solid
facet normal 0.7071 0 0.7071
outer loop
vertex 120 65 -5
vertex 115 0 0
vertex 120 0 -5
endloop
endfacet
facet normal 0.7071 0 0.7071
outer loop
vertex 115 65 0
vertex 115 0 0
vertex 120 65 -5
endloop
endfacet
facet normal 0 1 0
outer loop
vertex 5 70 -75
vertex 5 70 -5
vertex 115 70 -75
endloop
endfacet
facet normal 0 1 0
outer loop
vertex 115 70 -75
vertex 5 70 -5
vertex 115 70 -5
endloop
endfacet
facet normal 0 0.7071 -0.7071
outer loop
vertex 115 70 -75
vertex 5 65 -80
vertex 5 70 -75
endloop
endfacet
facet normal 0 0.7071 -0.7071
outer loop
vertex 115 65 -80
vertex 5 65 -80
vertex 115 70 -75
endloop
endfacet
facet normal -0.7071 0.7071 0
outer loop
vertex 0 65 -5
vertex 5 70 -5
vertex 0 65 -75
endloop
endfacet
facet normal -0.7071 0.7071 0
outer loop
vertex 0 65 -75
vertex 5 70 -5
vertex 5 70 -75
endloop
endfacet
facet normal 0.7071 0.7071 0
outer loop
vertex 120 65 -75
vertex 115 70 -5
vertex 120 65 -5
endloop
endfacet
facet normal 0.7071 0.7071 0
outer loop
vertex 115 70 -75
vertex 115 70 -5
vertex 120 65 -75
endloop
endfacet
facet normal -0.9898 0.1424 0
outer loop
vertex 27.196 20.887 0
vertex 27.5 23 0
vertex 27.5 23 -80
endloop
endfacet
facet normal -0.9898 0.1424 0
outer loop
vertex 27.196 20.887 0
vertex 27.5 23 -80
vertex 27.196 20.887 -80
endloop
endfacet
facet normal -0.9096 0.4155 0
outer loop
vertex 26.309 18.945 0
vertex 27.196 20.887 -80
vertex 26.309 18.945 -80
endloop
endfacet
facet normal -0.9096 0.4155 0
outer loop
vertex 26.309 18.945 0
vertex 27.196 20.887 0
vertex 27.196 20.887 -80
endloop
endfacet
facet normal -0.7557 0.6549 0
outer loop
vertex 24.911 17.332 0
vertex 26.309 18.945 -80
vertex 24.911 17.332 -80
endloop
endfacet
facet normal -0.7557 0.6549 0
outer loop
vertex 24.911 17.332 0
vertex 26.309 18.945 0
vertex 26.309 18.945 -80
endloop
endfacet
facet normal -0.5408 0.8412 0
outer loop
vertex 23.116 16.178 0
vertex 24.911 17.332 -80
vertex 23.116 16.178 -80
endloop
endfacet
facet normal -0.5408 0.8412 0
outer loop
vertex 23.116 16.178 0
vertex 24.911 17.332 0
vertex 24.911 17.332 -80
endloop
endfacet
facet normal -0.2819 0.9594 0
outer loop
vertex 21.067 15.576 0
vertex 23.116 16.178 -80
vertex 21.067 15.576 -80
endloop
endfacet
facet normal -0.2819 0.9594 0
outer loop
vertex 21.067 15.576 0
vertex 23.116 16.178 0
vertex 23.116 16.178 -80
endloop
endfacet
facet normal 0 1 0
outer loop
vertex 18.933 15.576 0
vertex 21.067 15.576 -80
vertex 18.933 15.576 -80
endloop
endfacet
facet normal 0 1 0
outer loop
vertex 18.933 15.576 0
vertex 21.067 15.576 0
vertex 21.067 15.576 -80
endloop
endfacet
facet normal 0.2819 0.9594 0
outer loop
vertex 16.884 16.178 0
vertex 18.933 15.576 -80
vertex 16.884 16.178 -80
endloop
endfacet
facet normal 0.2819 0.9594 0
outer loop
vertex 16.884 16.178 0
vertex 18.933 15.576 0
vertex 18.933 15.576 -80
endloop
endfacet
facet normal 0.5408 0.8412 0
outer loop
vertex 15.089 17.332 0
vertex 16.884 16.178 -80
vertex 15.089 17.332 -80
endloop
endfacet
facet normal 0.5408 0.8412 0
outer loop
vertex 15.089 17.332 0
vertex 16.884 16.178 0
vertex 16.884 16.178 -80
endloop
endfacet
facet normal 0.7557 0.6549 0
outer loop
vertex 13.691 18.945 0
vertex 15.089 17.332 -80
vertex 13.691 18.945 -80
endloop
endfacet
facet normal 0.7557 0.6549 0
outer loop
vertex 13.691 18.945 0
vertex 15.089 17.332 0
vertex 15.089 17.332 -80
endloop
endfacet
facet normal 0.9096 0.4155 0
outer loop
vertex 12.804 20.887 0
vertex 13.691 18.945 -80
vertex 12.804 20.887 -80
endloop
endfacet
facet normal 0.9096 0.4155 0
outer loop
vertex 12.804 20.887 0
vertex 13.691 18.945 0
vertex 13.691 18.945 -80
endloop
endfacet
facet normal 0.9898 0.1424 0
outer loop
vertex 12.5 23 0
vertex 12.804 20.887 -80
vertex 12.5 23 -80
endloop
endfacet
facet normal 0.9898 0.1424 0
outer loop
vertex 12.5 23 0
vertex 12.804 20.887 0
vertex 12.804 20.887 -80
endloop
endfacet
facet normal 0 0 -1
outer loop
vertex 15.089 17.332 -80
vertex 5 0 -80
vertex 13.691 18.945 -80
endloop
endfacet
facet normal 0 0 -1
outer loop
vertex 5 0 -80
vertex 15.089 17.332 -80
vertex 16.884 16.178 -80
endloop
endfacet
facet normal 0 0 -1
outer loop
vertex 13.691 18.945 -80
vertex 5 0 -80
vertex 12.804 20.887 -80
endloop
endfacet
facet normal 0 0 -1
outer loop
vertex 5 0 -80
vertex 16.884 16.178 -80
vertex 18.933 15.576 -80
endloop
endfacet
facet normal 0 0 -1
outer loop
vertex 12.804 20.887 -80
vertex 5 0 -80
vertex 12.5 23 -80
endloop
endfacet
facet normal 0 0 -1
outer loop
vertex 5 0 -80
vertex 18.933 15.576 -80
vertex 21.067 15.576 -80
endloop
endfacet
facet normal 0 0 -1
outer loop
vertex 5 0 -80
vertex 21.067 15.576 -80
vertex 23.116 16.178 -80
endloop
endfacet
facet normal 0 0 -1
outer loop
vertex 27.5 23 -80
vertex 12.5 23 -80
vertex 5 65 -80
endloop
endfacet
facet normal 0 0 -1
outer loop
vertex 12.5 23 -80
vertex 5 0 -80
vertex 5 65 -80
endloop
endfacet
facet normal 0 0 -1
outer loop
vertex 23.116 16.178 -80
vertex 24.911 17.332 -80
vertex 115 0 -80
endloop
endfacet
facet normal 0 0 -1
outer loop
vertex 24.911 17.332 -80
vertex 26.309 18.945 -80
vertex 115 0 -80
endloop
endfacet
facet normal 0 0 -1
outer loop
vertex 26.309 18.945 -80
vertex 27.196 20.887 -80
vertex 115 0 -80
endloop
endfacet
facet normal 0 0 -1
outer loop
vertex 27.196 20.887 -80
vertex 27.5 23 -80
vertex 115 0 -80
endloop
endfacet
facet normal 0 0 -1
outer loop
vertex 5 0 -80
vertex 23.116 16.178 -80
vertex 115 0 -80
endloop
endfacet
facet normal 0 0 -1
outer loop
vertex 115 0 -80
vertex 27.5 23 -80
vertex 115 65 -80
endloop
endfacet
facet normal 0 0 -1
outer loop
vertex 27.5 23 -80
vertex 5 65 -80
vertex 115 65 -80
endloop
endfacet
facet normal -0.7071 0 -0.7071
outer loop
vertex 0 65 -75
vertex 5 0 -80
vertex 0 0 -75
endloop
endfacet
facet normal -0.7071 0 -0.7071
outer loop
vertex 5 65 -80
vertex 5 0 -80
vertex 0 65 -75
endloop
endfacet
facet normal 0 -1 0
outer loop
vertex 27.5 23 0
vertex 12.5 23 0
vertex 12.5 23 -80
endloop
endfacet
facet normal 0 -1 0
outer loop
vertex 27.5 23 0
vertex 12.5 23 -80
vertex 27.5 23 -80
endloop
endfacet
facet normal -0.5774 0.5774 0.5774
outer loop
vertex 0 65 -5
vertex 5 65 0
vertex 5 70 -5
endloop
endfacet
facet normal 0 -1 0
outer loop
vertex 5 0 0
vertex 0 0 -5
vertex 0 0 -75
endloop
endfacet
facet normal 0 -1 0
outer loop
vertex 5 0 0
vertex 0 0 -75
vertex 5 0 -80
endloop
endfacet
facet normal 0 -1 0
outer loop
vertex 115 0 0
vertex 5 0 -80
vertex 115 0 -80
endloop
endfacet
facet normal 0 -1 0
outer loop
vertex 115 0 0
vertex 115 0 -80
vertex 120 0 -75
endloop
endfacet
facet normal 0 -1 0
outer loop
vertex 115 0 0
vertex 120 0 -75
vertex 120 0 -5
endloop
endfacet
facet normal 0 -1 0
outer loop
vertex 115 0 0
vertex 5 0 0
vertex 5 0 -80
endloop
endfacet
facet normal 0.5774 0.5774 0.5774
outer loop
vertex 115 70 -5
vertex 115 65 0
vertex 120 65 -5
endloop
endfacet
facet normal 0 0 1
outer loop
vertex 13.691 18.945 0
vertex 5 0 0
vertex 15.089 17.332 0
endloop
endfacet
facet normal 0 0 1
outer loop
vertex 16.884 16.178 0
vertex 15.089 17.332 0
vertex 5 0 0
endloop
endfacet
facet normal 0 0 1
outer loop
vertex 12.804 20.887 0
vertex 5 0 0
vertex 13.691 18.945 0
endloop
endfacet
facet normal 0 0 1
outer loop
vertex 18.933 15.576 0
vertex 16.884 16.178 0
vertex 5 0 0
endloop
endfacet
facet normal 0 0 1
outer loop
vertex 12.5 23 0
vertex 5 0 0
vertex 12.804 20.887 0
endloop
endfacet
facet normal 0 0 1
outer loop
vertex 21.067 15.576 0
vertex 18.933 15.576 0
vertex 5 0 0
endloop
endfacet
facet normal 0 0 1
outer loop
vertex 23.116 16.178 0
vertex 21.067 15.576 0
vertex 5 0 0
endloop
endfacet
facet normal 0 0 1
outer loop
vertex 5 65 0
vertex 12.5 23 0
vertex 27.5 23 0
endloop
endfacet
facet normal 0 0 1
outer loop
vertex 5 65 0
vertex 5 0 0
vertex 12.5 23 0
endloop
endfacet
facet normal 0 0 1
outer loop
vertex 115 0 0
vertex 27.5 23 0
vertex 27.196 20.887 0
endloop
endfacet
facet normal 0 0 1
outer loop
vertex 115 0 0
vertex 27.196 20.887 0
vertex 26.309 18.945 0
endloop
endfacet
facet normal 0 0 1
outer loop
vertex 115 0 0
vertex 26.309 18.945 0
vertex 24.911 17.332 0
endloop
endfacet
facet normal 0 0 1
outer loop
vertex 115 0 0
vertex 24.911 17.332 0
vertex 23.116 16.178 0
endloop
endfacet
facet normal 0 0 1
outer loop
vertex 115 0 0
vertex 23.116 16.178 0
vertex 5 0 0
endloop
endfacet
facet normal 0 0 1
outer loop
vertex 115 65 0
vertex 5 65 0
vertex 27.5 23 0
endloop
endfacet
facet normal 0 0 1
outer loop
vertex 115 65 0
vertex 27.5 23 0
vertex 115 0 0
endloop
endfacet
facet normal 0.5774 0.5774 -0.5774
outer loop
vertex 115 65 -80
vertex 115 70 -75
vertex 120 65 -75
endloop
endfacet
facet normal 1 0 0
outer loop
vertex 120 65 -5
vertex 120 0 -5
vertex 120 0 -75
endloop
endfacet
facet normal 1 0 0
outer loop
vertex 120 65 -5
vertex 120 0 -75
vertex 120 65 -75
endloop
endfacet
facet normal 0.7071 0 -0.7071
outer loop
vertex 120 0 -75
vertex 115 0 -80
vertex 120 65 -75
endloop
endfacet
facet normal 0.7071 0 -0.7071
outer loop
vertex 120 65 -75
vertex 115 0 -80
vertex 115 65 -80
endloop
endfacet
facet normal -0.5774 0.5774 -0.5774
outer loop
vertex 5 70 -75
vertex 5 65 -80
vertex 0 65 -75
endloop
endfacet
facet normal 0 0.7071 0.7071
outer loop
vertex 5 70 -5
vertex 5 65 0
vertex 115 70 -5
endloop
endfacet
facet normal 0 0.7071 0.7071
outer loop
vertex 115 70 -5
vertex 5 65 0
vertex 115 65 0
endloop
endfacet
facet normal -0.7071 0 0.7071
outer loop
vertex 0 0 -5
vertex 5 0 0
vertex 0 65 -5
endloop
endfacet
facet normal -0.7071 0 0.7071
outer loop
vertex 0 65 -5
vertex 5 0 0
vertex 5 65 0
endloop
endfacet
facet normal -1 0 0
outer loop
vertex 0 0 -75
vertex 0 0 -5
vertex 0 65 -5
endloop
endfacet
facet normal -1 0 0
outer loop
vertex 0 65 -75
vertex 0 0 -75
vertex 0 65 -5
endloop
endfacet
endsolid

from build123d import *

# Parameters (mm, degrees)
SKETCH1_W           = 120
SKETCH1_H           = 70
BOSS_EXTRUDE3_DEPTH = 80
CHAMFER2_SIZE       = 5
CUT_EXTRUDE1_DEPTH  = 161.312195419


with BuildPart() as part:
    # Sketch1 → Boss-Extrude3 (new body)
    with BuildSketch(Plane.XY):
        with Locations((60, 35)):
            Rectangle(SKETCH1_W, SKETCH1_H)
    extrude(amount=-BOSS_EXTRUDE3_DEPTH)

    # Chamfer2
    chamfer2_edges = [part.edges().sort_by_distance(p)[0] for p in [
        (60, 70, -80),
        (0, 35, -80),
        (0, 35, 0),
        (60, 70, 0),
        (120, 35, 0),
        (0, 70, -40),
        (120, 70, -40),
        (120, 35, -80),
    ]]
    chamfer(chamfer2_edges, length=CHAMFER2_SIZE)

    # Sketch5 → Cut-Extrude1 (cut, through all)
    with BuildSketch(Plane.XY):
        with BuildLine():
            Line((12.5, 23), (27.5, 23))
            ThreePointArc((27.5, 23), (20, 15.5), (12.5, 23))
        make_face()
    extrude(amount=-CUT_EXTRUDE1_DEPTH, mode=Mode.SUBTRACT)


solid = part.part
